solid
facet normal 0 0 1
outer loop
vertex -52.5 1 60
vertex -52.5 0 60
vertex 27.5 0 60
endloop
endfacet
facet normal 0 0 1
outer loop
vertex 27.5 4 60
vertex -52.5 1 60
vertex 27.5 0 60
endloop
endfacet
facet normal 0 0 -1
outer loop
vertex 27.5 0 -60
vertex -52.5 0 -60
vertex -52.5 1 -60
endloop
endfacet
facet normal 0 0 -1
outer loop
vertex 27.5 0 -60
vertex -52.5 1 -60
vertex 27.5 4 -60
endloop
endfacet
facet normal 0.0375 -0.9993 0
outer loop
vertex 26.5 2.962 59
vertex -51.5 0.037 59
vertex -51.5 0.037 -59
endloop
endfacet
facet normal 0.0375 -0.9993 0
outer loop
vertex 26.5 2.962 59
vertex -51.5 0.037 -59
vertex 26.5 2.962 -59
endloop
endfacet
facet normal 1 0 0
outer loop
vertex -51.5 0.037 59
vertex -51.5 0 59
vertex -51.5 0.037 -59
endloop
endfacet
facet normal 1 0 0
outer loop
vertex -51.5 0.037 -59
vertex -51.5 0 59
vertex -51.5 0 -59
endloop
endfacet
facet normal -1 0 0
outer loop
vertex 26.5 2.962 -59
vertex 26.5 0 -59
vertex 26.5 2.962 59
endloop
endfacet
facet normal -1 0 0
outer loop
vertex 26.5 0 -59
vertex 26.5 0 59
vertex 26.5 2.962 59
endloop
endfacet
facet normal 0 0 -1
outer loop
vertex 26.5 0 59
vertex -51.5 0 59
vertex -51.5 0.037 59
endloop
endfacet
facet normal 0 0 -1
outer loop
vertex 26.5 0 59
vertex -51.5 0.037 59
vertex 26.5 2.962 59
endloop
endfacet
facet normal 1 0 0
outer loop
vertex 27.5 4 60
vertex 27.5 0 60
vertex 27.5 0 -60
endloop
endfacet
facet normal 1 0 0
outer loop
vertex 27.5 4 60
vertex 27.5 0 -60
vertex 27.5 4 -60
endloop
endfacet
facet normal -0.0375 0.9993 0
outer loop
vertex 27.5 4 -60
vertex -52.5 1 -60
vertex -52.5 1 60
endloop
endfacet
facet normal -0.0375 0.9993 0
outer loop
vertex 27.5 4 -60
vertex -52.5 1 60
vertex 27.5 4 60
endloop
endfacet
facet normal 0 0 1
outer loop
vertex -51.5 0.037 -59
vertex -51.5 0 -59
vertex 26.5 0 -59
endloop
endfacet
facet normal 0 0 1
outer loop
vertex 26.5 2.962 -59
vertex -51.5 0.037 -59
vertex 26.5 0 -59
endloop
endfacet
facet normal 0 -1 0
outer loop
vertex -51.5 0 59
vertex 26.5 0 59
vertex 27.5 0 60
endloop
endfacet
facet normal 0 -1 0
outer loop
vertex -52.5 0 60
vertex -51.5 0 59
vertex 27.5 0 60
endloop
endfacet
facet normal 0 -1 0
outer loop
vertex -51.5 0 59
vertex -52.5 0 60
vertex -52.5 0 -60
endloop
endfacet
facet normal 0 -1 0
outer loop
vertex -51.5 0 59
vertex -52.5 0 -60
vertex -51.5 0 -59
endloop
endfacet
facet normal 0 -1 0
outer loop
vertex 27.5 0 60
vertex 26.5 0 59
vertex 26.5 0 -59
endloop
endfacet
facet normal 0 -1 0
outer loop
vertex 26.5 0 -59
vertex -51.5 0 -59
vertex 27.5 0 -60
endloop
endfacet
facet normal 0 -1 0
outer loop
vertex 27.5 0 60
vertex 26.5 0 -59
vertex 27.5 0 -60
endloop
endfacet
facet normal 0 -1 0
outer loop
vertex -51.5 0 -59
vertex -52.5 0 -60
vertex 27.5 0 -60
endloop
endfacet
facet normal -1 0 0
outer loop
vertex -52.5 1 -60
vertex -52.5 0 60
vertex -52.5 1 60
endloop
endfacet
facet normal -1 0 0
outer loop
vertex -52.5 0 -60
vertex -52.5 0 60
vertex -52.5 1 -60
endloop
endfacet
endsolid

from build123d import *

# Parameters (mm, degrees)
SKETCH_1_W          = 105
SKETCH_1_H          = 120
EXTRUDE_1_DEPTH     = 4
SKETCH_4_W          = 25
SKETCH_4_H          = 4
CUT_EXTRUDE_1_DEPTH = 155
CUT_EXTRUDE_3_DEPTH = 155
SHELL_1_T           = -1


with BuildPart() as part:
    # 스케치1 → 보스-돌출1 (new body)
    with BuildSketch(Plane(origin=(0, 0, 0), x_dir=(1, 0, 0), z_dir=(0, 1, 0))):
        Rectangle(SKETCH_1_W, SKETCH_1_H)
    extrude(amount=EXTRUDE_1_DEPTH)

    # 스케치4 → 컷-돌출1 (cut)
    with BuildSketch(Plane.XY.offset(60)):
        with Locations((40, 2)):
            Rectangle(SKETCH_4_W, SKETCH_4_H)
    extrude(amount=-CUT_EXTRUDE_1_DEPTH, mode=Mode.SUBTRACT)

    # 스케치6 → 컷-돌출3 (cut)
    with BuildSketch(Plane.XY.offset(60)):
        Polygon((-52.5, 4), (-52.5, 1), (27.5, 4), align=None)
    extrude(amount=-CUT_EXTRUDE_3_DEPTH, mode=Mode.SUBTRACT)

    # 쉘1
    shell_1_openings = [part.faces().sort_by_distance(p)[0] for p in [
        (-12.5, 0, 0),
    ]]
    offset(amount=SHELL_1_T, openings=shell_1_openings, kind=Kind.INTERSECTION)


solid = part.part
